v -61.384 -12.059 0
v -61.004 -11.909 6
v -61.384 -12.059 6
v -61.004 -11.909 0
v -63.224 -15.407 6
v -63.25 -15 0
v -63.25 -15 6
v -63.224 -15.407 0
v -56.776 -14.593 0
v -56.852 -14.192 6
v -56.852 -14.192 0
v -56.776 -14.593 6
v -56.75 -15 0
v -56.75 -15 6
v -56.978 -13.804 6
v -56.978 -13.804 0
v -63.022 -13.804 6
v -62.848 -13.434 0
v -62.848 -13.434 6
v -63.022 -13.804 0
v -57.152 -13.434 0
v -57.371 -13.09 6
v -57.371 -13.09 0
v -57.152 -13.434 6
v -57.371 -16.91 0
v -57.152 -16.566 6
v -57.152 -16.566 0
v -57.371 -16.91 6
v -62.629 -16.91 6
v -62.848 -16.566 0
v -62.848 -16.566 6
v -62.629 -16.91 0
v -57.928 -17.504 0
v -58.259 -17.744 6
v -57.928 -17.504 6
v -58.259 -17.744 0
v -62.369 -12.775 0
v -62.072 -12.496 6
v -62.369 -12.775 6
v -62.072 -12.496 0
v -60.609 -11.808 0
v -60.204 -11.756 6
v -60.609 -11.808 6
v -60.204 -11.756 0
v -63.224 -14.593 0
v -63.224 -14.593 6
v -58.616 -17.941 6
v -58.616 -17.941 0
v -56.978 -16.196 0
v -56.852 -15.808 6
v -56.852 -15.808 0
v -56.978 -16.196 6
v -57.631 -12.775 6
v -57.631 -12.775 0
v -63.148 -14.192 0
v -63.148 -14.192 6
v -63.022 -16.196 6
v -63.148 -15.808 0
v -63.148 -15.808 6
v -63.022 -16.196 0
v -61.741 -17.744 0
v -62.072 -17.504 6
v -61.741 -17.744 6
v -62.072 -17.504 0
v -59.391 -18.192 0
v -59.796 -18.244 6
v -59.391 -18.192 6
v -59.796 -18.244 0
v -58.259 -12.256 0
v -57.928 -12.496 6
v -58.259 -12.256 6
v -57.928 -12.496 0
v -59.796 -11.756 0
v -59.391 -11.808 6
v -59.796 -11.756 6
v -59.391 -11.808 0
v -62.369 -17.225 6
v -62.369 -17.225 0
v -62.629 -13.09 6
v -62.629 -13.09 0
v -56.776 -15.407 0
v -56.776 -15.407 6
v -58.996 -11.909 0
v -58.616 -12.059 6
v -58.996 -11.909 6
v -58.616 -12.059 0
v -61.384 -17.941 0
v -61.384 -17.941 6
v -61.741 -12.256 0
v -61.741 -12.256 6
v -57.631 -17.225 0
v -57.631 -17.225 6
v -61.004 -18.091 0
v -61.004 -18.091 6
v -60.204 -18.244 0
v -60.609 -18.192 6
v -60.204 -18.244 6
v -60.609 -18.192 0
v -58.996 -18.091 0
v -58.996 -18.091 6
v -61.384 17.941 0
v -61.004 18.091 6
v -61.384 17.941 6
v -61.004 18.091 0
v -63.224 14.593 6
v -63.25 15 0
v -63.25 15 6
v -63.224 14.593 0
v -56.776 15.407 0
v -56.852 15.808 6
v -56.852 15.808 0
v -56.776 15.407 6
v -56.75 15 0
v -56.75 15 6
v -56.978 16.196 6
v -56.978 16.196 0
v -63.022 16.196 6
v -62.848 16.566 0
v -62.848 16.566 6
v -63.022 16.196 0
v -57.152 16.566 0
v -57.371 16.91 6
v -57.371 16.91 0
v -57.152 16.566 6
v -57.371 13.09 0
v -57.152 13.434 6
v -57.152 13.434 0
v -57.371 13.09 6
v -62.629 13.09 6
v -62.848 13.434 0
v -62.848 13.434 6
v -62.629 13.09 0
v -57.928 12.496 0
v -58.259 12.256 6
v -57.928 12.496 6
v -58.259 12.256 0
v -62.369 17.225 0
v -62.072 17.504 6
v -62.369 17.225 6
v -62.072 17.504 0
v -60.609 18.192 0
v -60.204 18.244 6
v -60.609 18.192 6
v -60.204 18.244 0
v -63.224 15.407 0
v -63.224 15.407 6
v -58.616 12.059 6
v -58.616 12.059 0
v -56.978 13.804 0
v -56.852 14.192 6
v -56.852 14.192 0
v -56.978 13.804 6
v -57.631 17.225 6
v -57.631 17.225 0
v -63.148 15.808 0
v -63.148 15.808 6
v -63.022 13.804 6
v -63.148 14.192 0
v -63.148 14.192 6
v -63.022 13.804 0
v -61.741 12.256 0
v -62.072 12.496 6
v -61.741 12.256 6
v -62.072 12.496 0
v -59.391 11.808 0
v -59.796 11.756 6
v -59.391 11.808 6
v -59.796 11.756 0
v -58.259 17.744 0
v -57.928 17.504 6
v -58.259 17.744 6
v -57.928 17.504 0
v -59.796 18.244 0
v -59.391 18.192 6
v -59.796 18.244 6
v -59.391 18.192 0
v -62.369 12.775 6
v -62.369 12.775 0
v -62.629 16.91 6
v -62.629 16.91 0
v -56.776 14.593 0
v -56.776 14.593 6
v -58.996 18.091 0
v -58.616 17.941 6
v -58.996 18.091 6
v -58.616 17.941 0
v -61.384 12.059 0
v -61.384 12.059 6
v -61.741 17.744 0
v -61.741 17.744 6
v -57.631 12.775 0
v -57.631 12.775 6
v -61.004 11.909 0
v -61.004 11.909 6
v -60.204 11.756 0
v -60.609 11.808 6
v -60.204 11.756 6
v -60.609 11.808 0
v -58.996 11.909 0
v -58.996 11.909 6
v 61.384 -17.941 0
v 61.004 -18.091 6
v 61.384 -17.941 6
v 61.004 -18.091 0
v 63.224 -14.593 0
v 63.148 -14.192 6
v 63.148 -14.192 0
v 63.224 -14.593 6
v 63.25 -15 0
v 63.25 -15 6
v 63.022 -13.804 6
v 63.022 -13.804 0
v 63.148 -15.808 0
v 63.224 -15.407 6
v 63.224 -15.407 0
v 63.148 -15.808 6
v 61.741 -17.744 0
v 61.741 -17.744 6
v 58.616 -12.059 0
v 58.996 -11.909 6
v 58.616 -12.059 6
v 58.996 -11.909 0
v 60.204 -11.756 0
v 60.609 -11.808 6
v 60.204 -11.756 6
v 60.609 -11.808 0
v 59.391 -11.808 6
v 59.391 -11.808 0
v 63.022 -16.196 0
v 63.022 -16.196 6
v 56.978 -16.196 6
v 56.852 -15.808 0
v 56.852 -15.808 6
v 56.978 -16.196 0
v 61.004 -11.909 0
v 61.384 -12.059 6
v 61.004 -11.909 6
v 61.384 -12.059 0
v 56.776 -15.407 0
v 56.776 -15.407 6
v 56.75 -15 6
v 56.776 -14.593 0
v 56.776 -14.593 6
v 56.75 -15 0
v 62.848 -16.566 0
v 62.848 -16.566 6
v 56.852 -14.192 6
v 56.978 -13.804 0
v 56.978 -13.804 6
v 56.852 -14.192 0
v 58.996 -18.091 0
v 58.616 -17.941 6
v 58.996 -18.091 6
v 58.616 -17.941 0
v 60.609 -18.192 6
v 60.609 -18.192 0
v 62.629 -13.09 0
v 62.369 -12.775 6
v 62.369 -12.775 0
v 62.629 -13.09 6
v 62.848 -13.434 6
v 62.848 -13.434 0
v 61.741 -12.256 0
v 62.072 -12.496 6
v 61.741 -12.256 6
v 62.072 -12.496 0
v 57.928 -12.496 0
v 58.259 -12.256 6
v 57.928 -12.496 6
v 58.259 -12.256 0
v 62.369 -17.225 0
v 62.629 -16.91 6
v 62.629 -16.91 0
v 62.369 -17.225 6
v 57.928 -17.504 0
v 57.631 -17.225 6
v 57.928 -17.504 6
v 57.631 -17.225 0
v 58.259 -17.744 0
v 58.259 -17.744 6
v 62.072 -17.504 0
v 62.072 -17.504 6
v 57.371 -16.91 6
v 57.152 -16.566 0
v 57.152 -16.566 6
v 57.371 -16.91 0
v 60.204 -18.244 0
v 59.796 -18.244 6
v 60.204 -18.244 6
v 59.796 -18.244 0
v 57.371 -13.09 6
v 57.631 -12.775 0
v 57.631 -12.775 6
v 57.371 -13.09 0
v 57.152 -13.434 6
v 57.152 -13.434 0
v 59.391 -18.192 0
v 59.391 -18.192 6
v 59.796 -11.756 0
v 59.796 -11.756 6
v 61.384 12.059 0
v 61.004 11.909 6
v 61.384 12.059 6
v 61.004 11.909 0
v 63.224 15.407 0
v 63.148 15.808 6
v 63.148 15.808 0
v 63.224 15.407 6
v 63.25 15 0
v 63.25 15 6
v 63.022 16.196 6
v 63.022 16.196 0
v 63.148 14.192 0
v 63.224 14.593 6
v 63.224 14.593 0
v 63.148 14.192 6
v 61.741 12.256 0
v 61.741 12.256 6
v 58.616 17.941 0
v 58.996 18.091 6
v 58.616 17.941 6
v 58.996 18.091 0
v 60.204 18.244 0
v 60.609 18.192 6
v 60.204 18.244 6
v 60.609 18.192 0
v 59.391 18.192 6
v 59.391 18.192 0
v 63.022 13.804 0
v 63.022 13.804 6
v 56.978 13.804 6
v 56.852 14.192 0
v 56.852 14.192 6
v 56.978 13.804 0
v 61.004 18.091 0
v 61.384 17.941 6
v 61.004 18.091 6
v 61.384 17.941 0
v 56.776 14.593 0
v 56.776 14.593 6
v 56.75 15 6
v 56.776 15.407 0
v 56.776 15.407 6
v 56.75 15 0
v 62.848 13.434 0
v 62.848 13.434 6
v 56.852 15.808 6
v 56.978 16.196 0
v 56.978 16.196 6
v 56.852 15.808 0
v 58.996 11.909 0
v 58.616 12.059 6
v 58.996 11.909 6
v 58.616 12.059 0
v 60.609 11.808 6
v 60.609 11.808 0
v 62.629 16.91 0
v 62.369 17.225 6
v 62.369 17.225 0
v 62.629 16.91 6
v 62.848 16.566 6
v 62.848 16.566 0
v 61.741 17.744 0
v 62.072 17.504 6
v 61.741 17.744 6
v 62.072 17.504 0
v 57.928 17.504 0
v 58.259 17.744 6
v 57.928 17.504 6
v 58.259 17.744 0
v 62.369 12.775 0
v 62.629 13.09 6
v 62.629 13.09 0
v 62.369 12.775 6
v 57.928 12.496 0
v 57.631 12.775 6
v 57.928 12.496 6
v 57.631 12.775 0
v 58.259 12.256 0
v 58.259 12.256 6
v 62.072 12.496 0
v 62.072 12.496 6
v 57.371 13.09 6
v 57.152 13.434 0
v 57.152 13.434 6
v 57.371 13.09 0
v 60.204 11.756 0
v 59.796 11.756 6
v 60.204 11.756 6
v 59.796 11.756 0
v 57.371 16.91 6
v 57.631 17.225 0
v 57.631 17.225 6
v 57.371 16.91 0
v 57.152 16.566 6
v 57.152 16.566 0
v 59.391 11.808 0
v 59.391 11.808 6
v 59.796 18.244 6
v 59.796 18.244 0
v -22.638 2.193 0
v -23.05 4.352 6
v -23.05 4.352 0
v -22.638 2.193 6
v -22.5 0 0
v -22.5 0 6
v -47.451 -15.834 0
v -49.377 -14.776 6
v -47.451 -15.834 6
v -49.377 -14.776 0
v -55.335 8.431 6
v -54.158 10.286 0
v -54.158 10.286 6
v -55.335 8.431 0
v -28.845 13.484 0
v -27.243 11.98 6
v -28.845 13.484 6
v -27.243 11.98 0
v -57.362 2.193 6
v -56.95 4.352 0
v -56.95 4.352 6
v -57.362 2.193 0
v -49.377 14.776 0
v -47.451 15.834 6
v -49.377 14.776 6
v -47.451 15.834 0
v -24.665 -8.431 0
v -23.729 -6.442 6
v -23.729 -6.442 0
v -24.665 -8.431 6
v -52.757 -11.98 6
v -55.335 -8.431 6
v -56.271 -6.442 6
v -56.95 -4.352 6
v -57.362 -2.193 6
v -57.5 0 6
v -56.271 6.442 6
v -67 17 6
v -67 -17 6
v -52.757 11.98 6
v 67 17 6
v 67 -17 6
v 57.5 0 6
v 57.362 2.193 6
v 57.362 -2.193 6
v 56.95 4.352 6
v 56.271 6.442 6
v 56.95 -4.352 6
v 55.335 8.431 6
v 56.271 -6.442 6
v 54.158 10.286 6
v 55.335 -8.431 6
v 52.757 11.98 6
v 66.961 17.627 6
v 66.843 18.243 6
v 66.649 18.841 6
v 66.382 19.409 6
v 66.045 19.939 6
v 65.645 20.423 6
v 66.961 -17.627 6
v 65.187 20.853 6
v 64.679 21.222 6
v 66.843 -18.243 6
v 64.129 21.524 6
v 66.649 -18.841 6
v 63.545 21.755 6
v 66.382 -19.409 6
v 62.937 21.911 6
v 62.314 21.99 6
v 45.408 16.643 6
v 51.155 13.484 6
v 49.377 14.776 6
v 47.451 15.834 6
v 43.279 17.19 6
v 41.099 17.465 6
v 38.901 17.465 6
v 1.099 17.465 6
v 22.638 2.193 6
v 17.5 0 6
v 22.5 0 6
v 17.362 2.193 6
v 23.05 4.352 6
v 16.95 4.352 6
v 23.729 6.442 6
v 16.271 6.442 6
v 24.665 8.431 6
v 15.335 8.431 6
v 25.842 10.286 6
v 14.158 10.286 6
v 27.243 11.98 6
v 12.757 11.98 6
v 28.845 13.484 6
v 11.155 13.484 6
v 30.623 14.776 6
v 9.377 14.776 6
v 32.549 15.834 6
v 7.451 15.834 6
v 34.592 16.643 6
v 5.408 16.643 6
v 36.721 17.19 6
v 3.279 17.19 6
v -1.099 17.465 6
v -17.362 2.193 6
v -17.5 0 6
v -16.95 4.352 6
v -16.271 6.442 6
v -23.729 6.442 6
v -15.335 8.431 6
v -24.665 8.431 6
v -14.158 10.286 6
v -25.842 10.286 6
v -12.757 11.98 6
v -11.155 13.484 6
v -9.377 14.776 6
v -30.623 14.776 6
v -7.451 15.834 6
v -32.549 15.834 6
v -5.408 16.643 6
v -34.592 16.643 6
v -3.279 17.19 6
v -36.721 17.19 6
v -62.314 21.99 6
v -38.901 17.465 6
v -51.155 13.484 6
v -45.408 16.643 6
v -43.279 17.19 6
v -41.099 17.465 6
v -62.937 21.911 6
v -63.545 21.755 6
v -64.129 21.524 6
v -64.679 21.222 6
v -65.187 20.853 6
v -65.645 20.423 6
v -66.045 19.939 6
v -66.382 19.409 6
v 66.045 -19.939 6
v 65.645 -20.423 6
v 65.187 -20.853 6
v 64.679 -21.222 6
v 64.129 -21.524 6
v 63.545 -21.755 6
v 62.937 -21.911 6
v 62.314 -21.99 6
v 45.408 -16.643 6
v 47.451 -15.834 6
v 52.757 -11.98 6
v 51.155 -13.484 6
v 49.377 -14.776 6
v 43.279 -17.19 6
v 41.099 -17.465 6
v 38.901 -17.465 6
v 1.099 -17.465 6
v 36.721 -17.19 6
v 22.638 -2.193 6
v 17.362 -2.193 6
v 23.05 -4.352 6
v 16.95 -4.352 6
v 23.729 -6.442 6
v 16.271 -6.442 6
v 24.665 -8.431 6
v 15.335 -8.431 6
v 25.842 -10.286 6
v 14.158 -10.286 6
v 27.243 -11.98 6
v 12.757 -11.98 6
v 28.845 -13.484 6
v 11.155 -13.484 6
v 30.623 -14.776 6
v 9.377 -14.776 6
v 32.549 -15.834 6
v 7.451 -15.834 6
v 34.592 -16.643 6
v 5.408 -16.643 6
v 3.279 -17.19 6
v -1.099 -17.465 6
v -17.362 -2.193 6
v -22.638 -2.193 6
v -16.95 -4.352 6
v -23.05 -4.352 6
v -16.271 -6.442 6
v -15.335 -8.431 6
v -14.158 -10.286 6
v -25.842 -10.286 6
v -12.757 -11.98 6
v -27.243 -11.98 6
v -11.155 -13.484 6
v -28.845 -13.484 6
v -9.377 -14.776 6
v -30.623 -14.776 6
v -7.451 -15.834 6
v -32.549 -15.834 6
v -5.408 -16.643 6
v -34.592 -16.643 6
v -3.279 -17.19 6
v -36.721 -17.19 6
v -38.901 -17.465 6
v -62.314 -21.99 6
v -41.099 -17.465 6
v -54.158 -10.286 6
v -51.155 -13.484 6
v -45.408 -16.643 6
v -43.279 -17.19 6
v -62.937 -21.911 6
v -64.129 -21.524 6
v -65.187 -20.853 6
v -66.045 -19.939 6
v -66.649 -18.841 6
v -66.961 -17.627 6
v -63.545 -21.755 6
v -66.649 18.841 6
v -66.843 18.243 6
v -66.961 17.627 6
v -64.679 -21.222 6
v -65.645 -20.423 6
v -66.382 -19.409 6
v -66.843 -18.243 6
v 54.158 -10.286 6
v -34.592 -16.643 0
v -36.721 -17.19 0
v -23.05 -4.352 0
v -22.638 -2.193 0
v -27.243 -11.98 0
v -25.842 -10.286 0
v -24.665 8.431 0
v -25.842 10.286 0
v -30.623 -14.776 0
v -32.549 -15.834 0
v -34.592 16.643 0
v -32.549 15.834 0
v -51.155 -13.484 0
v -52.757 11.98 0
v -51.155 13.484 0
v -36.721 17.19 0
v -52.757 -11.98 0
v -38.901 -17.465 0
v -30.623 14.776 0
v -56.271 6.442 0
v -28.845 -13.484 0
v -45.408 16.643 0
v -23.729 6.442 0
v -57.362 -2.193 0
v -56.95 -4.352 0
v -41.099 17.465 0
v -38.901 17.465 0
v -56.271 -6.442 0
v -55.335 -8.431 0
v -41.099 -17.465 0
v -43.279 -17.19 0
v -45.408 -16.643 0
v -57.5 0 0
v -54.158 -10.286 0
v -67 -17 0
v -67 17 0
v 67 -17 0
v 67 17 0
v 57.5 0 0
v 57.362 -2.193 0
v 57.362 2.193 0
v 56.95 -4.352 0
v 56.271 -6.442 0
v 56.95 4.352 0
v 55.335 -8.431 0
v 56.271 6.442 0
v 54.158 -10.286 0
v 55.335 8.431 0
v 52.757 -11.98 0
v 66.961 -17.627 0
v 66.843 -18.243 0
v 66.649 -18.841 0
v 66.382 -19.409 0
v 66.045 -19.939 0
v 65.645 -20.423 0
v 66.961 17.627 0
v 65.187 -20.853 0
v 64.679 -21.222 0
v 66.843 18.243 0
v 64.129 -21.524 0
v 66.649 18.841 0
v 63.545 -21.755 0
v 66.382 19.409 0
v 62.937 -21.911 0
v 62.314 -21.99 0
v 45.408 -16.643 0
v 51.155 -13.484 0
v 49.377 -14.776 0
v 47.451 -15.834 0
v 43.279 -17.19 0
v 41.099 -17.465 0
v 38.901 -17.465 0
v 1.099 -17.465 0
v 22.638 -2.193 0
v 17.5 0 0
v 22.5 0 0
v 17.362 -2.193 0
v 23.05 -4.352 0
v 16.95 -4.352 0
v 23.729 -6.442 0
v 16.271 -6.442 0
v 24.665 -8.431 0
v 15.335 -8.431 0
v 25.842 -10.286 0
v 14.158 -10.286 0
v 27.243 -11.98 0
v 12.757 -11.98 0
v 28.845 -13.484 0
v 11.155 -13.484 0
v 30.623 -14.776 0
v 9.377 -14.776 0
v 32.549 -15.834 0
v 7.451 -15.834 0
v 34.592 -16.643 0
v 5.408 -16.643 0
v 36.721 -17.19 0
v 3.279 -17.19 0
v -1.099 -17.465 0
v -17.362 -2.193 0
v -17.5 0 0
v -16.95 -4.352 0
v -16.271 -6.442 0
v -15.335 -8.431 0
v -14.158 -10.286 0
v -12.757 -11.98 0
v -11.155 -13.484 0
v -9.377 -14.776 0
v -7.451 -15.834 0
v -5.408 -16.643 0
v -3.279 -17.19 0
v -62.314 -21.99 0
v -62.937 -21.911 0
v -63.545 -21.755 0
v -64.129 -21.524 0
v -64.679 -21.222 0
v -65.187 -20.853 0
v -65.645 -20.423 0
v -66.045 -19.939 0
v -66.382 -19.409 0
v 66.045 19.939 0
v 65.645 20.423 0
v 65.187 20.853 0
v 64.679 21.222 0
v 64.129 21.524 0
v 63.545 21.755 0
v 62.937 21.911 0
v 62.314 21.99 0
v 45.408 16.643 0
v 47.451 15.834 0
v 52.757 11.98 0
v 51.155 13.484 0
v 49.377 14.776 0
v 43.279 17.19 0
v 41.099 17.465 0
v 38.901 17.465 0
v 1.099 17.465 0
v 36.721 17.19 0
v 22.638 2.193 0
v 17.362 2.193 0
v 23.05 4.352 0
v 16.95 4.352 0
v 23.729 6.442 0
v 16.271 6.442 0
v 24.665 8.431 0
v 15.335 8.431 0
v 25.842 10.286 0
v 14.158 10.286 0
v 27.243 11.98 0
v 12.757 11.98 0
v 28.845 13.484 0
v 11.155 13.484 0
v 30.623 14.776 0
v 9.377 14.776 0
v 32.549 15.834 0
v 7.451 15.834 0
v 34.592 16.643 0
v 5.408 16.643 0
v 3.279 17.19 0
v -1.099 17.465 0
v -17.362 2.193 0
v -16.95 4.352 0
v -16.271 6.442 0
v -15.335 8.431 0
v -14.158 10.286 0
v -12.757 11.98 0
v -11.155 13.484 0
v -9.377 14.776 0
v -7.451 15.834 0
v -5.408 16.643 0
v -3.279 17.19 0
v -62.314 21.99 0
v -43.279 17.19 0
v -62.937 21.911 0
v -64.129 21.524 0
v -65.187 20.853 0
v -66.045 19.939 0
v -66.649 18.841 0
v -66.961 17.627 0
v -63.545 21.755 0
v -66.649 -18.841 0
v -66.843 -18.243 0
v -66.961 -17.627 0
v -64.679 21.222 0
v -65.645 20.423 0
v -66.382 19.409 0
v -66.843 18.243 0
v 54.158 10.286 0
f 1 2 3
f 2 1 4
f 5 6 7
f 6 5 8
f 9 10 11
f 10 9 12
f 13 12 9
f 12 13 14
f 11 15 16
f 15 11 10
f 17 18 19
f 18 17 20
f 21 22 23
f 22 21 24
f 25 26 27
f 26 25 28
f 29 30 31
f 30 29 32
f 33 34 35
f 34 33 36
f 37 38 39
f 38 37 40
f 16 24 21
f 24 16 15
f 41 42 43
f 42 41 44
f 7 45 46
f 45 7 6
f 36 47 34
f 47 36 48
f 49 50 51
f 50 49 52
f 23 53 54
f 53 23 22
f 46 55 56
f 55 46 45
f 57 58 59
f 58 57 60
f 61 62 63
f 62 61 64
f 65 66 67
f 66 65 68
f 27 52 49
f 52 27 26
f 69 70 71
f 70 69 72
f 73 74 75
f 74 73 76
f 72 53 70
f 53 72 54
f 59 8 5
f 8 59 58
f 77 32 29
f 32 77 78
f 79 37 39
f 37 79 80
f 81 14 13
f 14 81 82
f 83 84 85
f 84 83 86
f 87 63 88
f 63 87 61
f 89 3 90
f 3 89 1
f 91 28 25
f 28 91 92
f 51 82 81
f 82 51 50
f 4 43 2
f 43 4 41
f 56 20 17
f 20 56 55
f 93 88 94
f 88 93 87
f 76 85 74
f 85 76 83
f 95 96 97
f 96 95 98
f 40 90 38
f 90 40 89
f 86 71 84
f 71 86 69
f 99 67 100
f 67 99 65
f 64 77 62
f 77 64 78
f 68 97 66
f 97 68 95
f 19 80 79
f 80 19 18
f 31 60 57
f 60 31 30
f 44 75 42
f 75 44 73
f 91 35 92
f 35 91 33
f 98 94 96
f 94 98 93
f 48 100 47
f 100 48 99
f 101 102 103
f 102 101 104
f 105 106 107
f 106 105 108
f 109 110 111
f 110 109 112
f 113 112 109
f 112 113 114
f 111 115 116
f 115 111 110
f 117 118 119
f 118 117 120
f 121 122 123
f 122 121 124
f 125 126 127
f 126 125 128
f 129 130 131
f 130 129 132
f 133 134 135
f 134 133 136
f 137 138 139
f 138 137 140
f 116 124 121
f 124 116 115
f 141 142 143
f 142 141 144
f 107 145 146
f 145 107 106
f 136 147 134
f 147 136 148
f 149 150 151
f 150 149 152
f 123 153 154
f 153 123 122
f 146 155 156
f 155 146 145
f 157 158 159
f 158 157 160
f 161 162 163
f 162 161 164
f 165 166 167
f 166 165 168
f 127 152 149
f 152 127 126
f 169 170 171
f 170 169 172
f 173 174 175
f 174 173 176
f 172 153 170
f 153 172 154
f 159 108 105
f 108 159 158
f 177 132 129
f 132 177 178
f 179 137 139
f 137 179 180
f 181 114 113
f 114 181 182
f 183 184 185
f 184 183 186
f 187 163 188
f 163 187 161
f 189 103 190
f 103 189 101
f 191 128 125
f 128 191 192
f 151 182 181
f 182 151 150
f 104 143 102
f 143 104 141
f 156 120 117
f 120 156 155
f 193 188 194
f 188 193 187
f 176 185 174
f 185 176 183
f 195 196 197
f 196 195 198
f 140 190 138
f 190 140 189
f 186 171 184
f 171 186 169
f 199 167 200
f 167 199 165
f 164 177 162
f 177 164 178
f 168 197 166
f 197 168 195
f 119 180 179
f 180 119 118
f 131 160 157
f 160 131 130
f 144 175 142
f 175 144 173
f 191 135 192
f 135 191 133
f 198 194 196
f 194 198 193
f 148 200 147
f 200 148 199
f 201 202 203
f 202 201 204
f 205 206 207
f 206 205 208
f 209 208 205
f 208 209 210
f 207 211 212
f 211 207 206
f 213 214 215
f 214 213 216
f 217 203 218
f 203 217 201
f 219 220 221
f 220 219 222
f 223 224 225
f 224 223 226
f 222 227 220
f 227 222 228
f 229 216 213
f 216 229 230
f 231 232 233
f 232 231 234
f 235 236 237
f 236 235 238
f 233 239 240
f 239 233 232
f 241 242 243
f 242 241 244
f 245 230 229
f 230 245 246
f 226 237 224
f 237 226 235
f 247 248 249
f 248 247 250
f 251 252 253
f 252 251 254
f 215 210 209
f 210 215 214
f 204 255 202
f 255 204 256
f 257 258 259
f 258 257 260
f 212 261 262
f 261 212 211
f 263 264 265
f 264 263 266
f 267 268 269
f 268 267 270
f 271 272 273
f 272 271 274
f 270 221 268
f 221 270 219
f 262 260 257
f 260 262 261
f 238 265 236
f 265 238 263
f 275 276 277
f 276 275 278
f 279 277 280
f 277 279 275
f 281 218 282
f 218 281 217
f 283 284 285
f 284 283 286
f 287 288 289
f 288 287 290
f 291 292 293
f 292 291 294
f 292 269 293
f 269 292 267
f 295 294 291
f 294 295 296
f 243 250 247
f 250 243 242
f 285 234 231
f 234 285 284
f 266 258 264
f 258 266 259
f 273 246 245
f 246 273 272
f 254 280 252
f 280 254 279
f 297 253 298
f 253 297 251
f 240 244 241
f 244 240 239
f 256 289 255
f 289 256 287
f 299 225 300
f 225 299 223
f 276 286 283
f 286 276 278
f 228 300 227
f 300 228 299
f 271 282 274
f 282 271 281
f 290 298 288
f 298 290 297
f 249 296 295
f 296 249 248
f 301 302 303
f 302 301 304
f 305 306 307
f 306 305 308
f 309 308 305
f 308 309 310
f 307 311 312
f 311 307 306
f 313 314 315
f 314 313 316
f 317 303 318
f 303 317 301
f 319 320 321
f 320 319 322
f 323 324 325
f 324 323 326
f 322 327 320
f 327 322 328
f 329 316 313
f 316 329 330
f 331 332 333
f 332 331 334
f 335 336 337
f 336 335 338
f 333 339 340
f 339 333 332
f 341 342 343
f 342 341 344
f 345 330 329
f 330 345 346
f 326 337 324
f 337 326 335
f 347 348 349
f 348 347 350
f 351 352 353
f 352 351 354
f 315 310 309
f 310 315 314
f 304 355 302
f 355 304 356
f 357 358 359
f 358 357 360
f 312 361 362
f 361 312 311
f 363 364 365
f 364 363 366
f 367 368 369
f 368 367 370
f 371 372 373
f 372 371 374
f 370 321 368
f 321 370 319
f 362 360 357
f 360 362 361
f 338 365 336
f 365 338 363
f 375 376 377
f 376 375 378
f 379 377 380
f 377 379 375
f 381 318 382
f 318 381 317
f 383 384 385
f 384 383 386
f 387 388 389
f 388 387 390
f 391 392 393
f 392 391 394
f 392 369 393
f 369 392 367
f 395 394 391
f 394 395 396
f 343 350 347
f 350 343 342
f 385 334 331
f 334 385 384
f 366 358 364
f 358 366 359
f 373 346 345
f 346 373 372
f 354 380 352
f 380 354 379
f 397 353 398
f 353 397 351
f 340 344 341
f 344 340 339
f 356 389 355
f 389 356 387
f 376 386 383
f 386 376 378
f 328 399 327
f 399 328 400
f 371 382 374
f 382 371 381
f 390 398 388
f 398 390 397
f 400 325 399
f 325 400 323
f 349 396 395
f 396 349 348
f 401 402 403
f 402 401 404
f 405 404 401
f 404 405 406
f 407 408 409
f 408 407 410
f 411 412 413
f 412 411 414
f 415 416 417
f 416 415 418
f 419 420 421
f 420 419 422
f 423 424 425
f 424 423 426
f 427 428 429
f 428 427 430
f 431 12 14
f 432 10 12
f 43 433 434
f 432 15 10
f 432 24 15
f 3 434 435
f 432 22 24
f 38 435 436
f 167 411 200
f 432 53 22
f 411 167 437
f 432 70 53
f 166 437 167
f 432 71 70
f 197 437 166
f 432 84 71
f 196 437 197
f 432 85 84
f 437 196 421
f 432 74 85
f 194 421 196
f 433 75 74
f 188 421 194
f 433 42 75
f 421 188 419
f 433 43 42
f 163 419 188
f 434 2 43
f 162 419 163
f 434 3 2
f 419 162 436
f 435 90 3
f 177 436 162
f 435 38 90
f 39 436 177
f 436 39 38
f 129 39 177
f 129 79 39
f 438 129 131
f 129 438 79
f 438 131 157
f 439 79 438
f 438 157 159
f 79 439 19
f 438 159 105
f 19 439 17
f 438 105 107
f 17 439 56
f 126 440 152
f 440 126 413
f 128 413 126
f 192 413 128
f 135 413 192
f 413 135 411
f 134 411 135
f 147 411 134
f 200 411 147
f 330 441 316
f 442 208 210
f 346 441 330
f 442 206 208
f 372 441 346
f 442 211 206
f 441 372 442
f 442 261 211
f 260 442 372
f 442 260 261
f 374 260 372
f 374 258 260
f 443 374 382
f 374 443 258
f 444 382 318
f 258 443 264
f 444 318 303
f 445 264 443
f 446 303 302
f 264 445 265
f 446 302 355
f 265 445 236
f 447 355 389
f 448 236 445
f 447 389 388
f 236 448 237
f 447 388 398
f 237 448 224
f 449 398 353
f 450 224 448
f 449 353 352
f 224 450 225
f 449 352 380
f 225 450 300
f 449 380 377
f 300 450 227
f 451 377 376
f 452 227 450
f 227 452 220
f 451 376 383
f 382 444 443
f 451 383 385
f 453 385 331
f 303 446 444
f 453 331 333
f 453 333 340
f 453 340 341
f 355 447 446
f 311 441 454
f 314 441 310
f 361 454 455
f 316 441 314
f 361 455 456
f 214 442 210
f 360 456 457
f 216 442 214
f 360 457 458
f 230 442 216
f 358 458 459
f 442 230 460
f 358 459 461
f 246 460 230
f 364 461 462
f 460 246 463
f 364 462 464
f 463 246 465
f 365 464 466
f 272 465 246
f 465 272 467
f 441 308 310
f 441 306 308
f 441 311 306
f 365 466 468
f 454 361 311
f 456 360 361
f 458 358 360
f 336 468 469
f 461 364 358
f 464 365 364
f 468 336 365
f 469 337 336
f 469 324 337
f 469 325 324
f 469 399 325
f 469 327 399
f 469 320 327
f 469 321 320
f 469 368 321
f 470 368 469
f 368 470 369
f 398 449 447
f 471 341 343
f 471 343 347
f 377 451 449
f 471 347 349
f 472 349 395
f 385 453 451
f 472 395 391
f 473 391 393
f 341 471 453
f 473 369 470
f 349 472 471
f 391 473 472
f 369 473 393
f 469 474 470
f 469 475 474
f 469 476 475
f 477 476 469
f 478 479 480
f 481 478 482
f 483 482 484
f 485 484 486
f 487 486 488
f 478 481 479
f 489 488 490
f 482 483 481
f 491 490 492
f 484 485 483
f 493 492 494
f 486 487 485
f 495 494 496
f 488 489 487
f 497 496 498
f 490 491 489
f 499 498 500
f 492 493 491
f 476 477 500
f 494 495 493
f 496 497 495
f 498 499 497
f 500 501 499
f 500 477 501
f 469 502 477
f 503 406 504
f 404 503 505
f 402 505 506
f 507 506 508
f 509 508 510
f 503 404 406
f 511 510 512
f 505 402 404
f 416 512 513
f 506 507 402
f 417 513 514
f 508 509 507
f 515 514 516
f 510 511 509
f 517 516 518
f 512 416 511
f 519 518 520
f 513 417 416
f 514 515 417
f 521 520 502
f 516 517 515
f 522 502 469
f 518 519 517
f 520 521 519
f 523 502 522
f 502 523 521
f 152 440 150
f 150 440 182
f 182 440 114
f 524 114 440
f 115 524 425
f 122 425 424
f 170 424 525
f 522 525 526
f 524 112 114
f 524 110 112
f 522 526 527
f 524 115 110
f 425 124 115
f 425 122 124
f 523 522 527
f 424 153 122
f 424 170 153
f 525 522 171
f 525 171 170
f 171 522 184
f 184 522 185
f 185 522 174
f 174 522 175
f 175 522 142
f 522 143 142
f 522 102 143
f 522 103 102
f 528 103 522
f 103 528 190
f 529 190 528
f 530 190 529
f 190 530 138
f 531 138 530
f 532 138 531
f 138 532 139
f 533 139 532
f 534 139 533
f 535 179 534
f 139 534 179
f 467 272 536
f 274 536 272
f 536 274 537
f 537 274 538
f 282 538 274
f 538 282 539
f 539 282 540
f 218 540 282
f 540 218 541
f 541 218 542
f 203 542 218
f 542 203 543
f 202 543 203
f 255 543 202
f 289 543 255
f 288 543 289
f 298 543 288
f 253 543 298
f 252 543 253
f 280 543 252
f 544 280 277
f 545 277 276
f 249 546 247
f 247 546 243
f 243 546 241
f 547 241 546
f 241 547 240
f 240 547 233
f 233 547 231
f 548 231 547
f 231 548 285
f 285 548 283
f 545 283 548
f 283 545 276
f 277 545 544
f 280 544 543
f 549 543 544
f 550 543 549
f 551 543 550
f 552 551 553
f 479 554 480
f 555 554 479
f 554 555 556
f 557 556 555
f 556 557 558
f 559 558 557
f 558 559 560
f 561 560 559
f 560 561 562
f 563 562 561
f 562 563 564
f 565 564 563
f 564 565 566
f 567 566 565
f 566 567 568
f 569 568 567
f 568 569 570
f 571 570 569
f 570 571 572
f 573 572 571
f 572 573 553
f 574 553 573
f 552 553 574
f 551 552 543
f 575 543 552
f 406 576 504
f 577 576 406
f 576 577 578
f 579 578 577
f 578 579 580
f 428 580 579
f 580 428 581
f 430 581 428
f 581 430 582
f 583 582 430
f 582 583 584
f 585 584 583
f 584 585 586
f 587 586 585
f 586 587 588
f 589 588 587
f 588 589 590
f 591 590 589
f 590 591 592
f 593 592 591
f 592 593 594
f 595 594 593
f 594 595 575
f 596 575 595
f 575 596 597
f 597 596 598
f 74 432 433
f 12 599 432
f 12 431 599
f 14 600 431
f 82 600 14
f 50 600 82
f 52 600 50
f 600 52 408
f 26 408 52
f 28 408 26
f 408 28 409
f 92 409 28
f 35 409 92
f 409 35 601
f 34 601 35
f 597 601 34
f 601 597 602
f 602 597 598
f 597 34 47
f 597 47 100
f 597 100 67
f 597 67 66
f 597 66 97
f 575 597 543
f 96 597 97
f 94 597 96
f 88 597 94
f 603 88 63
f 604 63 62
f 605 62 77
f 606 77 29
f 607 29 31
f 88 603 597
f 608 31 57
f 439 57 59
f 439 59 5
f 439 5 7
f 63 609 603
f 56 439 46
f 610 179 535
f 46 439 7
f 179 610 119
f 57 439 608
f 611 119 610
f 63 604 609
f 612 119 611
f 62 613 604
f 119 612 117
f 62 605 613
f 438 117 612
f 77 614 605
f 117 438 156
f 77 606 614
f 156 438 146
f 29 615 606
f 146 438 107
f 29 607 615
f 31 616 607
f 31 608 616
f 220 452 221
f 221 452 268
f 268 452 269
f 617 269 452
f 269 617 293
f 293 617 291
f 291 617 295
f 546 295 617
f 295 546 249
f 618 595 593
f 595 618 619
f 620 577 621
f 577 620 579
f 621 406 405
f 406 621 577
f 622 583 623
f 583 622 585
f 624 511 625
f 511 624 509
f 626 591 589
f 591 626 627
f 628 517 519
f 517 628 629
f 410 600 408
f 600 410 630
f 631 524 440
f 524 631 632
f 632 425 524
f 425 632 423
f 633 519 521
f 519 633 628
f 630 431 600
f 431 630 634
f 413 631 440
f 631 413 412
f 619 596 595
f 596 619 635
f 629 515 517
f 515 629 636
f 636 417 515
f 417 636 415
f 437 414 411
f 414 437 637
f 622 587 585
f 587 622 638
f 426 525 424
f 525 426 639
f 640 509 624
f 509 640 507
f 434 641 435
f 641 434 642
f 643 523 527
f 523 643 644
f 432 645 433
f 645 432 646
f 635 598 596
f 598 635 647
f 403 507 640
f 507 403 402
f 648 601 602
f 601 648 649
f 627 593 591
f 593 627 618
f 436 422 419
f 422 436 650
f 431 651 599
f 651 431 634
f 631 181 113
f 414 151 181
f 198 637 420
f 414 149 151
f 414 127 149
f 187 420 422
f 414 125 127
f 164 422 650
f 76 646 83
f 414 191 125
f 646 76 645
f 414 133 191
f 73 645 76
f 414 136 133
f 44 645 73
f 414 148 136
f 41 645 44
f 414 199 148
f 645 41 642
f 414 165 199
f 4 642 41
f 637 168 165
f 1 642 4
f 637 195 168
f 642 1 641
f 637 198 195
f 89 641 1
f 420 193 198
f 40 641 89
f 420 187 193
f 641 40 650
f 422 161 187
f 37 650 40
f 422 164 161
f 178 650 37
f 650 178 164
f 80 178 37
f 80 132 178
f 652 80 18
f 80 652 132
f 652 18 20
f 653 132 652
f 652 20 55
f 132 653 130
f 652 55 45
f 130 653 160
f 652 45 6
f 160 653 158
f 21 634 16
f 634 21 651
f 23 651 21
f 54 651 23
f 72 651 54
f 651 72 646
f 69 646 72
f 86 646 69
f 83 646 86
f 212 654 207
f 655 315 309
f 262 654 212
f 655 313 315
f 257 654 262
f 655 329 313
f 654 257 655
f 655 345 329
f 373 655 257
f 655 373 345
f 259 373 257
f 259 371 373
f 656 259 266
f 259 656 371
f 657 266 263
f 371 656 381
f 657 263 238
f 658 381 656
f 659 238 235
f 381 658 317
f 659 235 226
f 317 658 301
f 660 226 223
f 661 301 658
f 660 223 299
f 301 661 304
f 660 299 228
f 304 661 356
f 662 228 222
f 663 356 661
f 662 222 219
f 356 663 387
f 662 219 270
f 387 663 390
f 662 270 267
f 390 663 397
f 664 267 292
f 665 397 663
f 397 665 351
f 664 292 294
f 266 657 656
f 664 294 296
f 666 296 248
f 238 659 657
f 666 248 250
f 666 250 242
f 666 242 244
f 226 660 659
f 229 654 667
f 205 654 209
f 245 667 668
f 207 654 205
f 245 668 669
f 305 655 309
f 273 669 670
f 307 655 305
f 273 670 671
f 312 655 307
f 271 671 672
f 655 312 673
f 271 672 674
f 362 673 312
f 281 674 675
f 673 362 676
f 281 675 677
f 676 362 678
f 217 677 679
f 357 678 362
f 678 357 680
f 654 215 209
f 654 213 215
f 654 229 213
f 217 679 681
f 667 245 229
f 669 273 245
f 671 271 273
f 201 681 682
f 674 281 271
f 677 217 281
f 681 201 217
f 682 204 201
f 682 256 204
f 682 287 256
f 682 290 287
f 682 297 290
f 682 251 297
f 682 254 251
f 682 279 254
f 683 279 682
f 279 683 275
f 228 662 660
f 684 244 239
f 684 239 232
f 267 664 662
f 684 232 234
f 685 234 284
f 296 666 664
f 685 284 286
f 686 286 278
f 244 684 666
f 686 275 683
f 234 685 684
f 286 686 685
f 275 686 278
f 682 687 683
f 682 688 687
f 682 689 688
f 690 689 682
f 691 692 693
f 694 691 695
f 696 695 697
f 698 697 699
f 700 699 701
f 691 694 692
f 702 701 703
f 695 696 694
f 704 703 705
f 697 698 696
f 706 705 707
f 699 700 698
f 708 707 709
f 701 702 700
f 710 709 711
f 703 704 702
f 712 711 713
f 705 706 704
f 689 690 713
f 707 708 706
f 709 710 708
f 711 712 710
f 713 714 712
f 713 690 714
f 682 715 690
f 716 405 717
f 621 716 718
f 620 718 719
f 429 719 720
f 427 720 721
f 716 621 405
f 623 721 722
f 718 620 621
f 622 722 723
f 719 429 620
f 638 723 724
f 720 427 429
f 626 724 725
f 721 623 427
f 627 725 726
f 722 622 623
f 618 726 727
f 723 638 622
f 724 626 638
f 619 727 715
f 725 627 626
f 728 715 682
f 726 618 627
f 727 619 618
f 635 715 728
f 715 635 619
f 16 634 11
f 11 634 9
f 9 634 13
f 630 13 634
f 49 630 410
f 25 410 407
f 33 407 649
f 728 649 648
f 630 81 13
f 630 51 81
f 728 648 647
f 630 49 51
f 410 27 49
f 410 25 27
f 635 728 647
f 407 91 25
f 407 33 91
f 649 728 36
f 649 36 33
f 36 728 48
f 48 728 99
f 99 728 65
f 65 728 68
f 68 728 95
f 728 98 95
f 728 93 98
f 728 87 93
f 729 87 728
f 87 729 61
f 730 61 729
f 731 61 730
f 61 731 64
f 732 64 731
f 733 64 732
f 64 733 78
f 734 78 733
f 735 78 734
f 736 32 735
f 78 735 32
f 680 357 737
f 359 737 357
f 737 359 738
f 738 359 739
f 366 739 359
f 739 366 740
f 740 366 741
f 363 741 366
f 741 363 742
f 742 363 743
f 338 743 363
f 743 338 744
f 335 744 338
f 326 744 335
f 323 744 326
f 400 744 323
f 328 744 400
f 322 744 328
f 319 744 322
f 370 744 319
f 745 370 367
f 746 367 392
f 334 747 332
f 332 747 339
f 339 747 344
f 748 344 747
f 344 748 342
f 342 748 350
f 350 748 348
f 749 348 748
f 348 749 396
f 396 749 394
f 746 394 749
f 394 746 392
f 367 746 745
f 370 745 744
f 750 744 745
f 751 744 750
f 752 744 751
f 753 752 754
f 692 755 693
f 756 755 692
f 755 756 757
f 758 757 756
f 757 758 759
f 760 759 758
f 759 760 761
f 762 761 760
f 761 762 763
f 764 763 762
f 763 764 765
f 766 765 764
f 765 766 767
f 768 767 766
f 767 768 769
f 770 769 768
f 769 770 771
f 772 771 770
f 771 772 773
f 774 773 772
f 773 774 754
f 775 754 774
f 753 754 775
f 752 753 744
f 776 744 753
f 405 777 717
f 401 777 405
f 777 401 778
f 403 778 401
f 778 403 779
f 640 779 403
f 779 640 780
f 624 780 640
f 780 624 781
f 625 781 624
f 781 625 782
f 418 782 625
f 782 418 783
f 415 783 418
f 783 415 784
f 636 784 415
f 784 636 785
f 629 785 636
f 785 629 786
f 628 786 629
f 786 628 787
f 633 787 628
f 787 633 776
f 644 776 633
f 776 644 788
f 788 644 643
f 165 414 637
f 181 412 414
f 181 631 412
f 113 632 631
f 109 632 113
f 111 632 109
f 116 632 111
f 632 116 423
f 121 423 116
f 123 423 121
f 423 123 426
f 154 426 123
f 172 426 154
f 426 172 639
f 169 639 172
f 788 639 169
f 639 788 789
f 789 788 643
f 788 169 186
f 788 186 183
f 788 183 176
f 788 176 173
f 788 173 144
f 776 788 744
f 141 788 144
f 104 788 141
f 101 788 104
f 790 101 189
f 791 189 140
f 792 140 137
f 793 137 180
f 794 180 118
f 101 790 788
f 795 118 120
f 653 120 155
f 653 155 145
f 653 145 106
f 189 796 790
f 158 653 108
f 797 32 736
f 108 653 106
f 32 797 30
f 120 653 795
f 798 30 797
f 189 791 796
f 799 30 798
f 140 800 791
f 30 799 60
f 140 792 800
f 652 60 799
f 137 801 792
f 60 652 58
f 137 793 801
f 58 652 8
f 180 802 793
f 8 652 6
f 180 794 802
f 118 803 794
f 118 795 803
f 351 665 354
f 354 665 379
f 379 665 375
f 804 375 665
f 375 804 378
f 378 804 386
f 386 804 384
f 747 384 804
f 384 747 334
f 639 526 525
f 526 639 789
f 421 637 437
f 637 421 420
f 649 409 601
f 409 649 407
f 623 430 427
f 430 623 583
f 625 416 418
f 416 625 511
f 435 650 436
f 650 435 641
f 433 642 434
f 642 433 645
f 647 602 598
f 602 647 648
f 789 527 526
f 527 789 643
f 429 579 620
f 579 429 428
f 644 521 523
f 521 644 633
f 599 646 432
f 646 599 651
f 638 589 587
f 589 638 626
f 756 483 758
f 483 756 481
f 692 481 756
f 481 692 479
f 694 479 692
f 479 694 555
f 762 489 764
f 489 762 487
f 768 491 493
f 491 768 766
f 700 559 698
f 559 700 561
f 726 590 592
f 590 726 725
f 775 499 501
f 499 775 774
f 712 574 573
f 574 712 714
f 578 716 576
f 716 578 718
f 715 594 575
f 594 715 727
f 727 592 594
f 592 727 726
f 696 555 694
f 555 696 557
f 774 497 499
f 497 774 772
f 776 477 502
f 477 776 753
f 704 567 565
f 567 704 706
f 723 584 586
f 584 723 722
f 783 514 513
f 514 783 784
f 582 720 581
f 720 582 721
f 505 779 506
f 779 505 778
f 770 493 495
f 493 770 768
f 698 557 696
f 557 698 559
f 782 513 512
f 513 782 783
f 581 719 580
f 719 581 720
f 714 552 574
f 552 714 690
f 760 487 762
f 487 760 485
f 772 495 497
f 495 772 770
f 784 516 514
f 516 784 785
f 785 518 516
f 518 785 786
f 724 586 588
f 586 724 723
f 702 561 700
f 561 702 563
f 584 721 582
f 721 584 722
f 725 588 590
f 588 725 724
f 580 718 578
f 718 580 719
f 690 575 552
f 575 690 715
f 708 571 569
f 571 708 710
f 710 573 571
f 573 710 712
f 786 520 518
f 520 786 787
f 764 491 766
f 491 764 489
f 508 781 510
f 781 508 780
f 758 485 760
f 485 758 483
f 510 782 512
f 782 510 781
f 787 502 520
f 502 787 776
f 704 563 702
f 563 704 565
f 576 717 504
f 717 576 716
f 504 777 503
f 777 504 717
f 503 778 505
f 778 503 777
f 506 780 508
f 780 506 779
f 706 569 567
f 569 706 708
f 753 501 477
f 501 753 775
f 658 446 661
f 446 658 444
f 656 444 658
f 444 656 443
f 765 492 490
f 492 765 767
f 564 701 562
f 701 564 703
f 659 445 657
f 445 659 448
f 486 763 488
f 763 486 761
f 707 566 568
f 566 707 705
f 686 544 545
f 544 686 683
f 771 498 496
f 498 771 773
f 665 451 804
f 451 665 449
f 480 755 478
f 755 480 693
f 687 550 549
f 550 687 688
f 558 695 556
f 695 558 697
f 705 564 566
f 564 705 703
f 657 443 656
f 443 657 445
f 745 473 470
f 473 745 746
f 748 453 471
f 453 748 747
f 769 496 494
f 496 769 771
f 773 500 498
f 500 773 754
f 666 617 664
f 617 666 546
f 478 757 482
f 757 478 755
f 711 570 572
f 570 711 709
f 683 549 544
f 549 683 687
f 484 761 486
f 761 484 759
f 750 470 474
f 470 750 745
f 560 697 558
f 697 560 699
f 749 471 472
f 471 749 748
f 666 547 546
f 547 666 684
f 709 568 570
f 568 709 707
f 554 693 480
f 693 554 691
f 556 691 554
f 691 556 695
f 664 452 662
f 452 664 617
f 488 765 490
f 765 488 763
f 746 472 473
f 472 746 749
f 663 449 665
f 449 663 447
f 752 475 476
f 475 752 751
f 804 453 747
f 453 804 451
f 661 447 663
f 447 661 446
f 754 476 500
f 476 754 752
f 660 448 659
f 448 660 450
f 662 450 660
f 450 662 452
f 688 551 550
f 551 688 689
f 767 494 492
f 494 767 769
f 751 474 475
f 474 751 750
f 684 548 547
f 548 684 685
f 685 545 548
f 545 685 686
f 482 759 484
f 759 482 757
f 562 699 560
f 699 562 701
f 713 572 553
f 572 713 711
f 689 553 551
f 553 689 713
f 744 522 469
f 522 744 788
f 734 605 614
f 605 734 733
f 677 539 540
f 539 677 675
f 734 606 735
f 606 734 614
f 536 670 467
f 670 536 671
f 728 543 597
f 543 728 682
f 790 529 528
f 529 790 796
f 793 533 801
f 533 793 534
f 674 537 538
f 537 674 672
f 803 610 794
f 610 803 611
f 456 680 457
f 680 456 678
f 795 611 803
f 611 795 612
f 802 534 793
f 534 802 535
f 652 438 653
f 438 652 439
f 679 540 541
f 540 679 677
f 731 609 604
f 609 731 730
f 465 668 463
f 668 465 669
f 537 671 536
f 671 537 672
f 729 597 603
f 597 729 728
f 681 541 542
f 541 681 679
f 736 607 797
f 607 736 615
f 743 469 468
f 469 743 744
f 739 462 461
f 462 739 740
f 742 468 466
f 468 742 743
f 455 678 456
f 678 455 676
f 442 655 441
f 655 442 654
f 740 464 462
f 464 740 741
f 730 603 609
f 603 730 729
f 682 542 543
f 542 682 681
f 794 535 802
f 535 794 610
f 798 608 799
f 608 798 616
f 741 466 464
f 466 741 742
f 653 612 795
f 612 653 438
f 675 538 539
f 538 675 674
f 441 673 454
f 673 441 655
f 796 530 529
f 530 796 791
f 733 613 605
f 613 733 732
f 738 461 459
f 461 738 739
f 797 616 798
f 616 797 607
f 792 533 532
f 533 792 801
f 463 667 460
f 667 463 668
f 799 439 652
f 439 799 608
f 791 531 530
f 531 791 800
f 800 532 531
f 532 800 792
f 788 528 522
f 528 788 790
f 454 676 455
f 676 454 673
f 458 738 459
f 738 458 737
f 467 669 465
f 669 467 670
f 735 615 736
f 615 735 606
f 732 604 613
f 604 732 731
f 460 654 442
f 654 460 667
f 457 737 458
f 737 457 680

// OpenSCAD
$fn = 50;


difference() {
	union() {
		hull() {
			translate(v = [-62.0000000000, 17.0000000000, 0]) {
				cylinder(h = 6, r = 5);
			}
			translate(v = [62.0000000000, 17.0000000000, 0]) {
				cylinder(h = 6, r = 5);
			}
			translate(v = [-62.0000000000, -17.0000000000, 0]) {
				cylinder(h = 6, r = 5);
			}
			translate(v = [62.0000000000, -17.0000000000, 0]) {
				cylinder(h = 6, r = 5);
			}
		}
	}
	union() {
		#translate(v = [-60.0000000000, -15.0000000000, -100.0000000000]) {
			cylinder(h = 200, r = 3.2500000000);
		}
		#translate(v = [-60.0000000000, 15.0000000000, -100.0000000000]) {
			cylinder(h = 200, r = 3.2500000000);
		}
		#translate(v = [60.0000000000, -15.0000000000, -100.0000000000]) {
			cylinder(h = 200, r = 3.2500000000);
		}
		#translate(v = [60.0000000000, 15.0000000000, -100.0000000000]) {
			cylinder(h = 200, r = 3.2500000000);
		}
		#translate(v = [-40.0000000000, 0, 0]) {
			cylinder(h = 6, r = 17.5000000000);
		}
		#cylinder(h = 6, r = 17.5000000000);
		#translate(v = [40.0000000000, 0, 0]) {
			cylinder(h = 6, r = 17.5000000000);
		}
	}
}
